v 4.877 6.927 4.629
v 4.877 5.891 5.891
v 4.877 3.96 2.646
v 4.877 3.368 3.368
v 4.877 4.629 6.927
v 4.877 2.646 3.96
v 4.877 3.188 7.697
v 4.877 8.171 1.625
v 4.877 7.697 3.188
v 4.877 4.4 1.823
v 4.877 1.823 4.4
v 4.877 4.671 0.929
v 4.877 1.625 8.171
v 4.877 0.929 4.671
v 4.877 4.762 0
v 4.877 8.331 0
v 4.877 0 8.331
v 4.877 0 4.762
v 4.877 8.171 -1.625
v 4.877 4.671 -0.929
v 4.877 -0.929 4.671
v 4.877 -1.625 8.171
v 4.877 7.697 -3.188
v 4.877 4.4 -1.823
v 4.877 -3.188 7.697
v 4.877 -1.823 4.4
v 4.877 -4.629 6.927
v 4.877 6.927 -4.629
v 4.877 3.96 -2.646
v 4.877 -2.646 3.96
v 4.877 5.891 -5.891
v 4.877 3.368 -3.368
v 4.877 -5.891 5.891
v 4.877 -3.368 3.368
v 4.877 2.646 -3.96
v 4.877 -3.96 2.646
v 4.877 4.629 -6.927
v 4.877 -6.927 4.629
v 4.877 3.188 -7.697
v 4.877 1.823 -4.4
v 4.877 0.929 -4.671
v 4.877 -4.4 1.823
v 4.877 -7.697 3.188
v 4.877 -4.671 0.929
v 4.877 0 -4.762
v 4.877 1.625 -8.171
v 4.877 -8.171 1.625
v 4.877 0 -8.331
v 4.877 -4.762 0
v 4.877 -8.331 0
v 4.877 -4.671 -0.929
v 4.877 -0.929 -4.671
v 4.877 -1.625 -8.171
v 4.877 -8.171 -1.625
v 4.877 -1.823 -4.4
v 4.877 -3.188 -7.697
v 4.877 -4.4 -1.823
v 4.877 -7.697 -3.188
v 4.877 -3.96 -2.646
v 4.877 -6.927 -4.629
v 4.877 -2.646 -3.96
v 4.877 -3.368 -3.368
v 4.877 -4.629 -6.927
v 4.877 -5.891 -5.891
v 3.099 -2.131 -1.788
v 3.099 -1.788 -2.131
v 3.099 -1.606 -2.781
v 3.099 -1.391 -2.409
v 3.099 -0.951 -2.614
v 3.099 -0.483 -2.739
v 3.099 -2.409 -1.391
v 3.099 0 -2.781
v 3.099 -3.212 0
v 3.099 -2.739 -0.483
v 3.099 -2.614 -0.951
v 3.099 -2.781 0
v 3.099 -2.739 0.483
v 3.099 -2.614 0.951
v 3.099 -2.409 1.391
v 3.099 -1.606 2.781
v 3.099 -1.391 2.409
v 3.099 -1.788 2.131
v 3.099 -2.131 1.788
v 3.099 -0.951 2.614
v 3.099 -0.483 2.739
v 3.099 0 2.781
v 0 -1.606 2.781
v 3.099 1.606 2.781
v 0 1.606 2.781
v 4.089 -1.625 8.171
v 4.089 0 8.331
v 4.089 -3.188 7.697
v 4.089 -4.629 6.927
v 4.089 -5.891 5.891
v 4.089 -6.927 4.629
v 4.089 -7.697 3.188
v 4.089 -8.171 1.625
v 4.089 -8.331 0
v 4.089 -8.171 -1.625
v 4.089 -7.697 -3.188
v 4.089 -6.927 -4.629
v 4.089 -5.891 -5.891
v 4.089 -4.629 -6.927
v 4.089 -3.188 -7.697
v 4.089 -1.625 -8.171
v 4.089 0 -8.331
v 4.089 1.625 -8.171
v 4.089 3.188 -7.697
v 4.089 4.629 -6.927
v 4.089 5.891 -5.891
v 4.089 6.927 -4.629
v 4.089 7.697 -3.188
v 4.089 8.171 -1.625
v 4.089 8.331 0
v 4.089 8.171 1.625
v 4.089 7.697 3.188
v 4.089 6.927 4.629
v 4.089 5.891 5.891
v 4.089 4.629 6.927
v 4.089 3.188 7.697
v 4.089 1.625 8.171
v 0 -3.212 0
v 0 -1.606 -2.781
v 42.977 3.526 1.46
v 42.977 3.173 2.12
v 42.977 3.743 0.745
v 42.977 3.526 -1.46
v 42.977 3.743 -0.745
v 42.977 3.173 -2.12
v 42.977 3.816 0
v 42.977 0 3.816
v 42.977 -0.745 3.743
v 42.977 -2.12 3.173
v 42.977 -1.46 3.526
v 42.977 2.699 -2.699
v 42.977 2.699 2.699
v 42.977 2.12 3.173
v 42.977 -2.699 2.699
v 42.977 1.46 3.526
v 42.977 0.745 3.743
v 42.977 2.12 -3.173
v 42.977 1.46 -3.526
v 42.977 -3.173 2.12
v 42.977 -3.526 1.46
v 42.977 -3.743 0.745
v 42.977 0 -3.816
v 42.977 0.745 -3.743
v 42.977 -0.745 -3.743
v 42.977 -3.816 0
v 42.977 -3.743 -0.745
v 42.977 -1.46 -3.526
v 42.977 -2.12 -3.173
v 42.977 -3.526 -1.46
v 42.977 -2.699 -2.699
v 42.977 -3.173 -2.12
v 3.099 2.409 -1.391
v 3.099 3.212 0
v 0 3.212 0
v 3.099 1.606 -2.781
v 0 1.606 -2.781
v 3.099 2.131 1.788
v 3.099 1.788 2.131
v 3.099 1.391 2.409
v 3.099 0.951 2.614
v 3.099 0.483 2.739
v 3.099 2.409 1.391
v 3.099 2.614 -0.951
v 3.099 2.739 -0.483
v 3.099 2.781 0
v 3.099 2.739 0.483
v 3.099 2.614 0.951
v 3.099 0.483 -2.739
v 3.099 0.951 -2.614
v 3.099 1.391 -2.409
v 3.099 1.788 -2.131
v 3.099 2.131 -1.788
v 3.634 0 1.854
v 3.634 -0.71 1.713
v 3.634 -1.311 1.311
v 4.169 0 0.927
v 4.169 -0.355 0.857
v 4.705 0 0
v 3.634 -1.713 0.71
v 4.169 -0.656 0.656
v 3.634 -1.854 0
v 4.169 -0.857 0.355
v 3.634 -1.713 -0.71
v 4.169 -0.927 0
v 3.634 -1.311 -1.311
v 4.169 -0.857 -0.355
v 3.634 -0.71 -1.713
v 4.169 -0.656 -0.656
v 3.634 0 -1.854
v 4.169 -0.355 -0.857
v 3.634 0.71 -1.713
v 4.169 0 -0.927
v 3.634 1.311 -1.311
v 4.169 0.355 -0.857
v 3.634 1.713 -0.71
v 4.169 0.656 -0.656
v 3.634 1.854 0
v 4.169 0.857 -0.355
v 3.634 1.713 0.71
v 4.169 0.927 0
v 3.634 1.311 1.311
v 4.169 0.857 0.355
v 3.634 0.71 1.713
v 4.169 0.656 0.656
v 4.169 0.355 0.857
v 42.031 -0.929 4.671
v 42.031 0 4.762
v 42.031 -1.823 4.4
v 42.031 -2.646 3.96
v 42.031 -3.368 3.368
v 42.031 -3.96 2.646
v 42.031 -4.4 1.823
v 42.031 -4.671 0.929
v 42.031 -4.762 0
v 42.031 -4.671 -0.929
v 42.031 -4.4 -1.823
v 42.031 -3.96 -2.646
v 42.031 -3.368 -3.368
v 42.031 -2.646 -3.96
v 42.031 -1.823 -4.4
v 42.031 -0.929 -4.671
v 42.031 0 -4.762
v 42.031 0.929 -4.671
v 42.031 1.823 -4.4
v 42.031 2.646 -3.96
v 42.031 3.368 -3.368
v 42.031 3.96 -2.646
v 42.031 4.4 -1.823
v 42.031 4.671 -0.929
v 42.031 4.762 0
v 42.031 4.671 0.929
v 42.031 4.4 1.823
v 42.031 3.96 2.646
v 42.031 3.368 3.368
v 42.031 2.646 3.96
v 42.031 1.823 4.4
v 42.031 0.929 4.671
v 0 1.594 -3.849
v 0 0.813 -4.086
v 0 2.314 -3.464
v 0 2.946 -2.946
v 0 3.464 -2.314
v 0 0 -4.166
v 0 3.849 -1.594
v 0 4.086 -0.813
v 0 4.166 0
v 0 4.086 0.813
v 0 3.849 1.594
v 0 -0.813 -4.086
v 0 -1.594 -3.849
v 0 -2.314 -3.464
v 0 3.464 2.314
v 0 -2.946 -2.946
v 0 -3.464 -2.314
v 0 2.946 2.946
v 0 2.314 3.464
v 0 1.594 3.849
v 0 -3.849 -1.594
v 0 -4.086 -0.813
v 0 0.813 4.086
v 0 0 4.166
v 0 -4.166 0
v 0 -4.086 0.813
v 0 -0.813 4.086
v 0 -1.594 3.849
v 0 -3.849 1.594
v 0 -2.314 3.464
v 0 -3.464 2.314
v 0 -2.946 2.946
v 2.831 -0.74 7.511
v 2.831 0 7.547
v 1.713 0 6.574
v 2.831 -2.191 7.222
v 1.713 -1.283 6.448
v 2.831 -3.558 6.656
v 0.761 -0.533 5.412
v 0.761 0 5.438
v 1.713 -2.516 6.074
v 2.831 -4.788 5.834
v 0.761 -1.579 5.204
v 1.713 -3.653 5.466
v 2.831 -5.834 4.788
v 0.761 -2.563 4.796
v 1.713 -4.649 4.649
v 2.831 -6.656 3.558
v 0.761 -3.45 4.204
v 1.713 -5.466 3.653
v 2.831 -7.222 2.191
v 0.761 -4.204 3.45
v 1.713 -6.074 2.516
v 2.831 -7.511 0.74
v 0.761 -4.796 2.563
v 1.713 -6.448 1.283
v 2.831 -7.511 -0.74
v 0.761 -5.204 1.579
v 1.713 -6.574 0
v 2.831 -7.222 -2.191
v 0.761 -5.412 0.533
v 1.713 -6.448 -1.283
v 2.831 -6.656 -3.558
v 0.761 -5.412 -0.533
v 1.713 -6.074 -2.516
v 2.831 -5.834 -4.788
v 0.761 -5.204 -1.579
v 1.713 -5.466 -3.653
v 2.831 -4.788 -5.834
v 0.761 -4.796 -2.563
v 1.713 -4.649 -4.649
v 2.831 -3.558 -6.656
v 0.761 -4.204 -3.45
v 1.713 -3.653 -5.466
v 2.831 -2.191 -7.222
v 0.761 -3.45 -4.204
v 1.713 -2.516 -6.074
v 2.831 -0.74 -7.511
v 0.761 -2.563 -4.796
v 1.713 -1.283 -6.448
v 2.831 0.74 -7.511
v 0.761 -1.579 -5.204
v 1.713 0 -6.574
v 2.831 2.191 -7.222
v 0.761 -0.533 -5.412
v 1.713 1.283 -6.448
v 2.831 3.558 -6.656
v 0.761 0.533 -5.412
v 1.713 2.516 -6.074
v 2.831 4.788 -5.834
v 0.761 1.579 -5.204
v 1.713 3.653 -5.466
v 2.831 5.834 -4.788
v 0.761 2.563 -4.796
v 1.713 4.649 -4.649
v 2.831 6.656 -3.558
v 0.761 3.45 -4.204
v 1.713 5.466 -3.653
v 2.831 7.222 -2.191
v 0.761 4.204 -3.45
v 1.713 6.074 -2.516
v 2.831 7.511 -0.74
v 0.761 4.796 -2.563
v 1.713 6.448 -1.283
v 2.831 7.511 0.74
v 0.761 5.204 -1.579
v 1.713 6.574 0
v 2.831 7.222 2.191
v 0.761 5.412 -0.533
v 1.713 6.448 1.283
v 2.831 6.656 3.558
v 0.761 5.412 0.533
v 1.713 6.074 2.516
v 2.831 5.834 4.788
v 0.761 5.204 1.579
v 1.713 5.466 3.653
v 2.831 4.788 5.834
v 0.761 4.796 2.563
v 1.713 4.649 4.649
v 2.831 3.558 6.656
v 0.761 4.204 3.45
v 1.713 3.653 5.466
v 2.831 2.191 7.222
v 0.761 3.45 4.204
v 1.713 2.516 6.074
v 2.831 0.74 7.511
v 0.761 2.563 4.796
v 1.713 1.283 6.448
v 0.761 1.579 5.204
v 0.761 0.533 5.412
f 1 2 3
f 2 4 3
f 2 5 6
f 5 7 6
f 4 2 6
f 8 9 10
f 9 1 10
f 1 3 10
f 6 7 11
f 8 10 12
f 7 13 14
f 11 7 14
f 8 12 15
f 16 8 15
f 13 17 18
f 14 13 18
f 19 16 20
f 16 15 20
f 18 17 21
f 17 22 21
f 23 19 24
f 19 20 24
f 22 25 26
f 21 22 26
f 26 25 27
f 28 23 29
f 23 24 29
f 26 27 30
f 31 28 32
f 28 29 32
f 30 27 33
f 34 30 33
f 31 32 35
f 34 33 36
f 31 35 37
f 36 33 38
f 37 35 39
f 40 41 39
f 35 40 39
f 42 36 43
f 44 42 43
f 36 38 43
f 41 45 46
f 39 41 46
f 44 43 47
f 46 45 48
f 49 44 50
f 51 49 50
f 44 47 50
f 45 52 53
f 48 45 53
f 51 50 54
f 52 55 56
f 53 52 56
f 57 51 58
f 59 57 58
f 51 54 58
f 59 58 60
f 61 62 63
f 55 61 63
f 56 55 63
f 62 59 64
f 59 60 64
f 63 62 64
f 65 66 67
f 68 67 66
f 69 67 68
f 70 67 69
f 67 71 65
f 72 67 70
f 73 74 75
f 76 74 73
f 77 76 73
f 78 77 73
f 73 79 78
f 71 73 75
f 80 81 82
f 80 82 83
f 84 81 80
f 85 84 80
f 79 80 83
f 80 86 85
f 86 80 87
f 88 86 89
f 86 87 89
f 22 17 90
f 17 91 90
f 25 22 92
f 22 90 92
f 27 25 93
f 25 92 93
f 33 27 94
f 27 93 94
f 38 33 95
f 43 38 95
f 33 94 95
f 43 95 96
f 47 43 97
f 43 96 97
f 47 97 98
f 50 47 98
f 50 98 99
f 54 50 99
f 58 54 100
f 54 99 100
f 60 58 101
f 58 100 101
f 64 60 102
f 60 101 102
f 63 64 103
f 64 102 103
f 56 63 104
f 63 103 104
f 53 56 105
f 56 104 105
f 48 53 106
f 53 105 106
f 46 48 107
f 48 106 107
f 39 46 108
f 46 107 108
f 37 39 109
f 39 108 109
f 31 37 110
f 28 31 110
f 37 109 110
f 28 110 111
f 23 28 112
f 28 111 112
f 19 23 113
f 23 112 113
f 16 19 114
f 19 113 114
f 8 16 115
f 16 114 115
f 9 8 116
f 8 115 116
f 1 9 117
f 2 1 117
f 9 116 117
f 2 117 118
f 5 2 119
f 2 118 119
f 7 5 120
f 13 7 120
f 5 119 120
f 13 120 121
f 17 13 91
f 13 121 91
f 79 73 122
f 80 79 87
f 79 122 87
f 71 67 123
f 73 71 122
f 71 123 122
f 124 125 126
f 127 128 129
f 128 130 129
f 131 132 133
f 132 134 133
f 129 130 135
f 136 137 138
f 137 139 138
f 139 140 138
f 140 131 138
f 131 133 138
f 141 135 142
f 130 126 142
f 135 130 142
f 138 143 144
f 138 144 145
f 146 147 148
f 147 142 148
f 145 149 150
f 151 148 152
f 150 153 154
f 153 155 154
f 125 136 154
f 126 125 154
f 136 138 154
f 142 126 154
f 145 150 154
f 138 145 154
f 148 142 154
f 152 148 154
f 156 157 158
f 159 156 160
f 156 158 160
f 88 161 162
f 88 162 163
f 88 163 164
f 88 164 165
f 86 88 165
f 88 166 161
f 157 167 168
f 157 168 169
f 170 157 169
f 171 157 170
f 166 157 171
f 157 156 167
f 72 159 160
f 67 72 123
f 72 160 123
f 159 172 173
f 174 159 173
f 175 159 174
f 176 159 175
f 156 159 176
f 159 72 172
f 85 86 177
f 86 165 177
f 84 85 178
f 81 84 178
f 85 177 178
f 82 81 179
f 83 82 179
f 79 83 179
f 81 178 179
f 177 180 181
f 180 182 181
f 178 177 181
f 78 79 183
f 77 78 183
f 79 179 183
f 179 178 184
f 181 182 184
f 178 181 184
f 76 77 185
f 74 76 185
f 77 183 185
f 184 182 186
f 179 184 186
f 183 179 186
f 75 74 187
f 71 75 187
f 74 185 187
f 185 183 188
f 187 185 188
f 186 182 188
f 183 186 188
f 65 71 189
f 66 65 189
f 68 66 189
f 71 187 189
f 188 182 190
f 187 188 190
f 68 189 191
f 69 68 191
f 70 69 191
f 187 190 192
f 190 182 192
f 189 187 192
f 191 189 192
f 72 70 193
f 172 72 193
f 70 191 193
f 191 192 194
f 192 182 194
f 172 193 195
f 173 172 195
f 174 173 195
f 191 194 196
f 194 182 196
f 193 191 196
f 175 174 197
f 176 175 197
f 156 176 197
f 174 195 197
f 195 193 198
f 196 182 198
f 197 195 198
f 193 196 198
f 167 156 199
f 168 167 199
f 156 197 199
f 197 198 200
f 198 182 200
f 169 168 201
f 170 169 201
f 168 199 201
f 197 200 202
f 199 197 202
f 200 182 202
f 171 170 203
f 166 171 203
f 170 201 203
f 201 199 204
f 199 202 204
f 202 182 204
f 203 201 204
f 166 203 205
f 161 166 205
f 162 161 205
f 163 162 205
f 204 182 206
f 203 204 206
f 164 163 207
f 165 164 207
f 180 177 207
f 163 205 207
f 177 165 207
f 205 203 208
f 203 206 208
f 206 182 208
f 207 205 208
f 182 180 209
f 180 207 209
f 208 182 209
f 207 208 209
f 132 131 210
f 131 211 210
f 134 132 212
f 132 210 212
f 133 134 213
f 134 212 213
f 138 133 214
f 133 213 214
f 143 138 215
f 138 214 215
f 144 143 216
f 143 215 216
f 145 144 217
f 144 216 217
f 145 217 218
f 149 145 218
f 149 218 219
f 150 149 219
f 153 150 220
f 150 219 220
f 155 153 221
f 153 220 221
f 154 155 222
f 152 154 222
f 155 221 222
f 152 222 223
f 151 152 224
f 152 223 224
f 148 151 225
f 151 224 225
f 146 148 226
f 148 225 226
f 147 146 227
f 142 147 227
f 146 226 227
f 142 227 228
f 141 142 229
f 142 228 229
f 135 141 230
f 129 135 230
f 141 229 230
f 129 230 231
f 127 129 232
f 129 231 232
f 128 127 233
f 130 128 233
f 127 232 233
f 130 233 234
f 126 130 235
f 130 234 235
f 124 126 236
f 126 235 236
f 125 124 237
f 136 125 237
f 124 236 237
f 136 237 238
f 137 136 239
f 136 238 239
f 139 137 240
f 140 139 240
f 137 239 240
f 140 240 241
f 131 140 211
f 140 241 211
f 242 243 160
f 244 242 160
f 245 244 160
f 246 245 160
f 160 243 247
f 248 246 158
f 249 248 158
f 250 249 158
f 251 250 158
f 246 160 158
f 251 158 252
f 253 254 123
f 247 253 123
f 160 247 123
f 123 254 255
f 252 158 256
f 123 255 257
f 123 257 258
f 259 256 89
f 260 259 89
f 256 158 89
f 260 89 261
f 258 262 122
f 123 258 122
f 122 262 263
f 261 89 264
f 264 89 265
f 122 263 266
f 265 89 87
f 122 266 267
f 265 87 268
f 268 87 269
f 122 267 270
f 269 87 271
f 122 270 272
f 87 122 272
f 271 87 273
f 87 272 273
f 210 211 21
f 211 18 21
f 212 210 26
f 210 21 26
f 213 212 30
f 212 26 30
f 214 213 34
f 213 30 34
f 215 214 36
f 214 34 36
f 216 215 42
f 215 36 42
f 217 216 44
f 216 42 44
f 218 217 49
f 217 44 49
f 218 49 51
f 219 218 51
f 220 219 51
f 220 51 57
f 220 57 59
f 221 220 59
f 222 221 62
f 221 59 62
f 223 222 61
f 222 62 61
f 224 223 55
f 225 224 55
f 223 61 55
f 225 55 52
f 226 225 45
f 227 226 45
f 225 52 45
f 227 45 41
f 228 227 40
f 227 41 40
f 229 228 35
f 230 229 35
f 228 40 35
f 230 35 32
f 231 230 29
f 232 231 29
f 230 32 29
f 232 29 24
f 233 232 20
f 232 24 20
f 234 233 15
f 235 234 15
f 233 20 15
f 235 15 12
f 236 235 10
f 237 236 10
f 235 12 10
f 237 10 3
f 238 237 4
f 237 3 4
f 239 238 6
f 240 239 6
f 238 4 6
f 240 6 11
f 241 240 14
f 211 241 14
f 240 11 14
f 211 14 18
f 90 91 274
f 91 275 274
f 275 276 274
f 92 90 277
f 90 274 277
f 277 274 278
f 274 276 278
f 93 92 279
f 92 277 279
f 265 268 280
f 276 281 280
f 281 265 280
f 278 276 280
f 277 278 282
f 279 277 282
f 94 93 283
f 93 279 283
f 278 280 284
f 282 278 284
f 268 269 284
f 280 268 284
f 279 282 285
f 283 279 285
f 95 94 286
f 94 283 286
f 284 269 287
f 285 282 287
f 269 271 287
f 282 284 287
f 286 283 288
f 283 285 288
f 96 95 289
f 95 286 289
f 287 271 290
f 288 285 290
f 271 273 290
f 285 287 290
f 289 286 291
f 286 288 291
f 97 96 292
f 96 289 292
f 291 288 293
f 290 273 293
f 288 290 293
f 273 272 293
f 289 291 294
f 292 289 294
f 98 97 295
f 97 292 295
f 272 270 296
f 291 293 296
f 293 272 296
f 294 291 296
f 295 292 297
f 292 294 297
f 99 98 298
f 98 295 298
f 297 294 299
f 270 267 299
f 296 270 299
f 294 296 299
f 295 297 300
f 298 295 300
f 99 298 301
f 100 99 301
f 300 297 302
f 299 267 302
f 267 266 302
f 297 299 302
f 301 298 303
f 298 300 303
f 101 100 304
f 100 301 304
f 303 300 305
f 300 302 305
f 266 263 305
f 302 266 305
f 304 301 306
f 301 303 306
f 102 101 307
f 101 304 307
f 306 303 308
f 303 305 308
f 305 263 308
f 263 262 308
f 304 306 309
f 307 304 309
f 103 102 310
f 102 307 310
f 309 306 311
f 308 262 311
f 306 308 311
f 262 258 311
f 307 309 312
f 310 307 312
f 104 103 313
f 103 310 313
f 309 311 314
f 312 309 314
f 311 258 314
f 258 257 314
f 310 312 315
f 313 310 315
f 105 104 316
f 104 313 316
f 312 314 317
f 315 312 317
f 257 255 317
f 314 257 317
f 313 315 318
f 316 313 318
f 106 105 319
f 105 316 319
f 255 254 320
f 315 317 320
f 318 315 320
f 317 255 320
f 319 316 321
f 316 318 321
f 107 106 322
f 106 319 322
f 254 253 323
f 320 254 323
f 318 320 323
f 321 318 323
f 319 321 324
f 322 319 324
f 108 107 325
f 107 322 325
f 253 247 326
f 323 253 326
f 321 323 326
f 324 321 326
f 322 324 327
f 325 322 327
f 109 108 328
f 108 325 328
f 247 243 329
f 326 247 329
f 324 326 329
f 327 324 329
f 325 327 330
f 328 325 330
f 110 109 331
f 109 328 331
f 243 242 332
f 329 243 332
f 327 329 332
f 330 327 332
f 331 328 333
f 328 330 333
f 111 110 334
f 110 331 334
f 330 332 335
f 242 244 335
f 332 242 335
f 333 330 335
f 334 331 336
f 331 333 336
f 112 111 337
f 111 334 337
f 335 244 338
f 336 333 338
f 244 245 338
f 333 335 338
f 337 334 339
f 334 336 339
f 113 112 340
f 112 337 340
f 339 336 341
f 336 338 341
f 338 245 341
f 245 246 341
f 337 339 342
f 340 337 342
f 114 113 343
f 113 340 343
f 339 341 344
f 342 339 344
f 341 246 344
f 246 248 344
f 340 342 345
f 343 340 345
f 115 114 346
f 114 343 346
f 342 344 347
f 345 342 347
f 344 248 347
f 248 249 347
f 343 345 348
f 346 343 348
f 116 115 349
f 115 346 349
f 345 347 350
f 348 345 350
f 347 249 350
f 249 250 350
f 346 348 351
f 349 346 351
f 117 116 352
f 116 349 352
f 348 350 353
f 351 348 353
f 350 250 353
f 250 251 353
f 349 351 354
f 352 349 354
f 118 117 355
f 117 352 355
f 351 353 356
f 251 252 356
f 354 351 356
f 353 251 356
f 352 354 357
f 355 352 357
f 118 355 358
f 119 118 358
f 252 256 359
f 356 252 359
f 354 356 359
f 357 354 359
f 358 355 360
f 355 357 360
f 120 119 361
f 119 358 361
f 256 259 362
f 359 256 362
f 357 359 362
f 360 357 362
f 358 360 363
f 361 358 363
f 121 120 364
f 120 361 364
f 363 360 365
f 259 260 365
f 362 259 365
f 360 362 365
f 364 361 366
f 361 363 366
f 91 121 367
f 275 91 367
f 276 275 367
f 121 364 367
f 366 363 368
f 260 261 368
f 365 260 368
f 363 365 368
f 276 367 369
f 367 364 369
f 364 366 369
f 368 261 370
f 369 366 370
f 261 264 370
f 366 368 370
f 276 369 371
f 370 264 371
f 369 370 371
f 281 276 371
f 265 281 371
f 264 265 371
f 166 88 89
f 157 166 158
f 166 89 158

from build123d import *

# Parameters (mm, degrees)
HEX_2_DEPTH = 3.0988


with BuildPart() as part:
    # BodySke → BaseBody (revolve)
    with BuildSketch(Plane.XY, mode=Mode.PRIVATE) as basebody_sk:
        with BuildLine():
            Line((42.9768, 0), (42.9768, 3.81635))
            Line((42.9768, 3.81635), (42.03065, 4.7625))
            Line((42.03065, 4.7625), (4.8768, 4.7625))
            Line((4.8768, 4.7625), (4.8768, 8.3312))
            Line((4.8768, 8.3312), (4.0894, 8.3312))
            ThreePointArc((4.0894, 8.3312), (1.712581673, 6.574442992), (0, 4.1656))
            Line((0, 4.1656), (0, 0))
            Line((0, 0), (42.9768, 0))
        make_face()
    revolve(basebody_sk.sketch.rotate(Axis((0, 0, 0), (1, 0, 0)), 90), axis=Axis((0, 0, 0), (1, 0, 0)))  # turned: the seam where the file's is

    # Sketch2 → PreBroach (revolve, cut)
    with BuildSketch(Plane.XY, mode=Mode.PRIVATE) as prebroach_sk:
        Polygon((0, 2.7813), (3.0988, 2.7813), (4.704584304, 0), (0, 0), align=None)
    revolve(prebroach_sk.sketch.rotate(Axis((0, 0, 0), (1, 0, 0)), 90), axis=Axis((0, 0, 0), (1, 0, 0)), mode=Mode.SUBTRACT)  # turned: the seam where the file's is

    # Sketch3 → Hex 2 (cut)
    with BuildSketch(Plane(origin=(0, 0, 0), x_dir=(0, 0, -1), z_dir=(1, 0, 0))):
        Polygon((-2.7813, -1.605784304), (-2.7813, 1.605784304), (0, 3.211568607), (2.7813, 1.605784304), (2.7813, -1.605784304), (0, -3.211568607), align=None)
    extrude(amount=HEX_2_DEPTH, mode=Mode.SUBTRACT)


solid = part.part
